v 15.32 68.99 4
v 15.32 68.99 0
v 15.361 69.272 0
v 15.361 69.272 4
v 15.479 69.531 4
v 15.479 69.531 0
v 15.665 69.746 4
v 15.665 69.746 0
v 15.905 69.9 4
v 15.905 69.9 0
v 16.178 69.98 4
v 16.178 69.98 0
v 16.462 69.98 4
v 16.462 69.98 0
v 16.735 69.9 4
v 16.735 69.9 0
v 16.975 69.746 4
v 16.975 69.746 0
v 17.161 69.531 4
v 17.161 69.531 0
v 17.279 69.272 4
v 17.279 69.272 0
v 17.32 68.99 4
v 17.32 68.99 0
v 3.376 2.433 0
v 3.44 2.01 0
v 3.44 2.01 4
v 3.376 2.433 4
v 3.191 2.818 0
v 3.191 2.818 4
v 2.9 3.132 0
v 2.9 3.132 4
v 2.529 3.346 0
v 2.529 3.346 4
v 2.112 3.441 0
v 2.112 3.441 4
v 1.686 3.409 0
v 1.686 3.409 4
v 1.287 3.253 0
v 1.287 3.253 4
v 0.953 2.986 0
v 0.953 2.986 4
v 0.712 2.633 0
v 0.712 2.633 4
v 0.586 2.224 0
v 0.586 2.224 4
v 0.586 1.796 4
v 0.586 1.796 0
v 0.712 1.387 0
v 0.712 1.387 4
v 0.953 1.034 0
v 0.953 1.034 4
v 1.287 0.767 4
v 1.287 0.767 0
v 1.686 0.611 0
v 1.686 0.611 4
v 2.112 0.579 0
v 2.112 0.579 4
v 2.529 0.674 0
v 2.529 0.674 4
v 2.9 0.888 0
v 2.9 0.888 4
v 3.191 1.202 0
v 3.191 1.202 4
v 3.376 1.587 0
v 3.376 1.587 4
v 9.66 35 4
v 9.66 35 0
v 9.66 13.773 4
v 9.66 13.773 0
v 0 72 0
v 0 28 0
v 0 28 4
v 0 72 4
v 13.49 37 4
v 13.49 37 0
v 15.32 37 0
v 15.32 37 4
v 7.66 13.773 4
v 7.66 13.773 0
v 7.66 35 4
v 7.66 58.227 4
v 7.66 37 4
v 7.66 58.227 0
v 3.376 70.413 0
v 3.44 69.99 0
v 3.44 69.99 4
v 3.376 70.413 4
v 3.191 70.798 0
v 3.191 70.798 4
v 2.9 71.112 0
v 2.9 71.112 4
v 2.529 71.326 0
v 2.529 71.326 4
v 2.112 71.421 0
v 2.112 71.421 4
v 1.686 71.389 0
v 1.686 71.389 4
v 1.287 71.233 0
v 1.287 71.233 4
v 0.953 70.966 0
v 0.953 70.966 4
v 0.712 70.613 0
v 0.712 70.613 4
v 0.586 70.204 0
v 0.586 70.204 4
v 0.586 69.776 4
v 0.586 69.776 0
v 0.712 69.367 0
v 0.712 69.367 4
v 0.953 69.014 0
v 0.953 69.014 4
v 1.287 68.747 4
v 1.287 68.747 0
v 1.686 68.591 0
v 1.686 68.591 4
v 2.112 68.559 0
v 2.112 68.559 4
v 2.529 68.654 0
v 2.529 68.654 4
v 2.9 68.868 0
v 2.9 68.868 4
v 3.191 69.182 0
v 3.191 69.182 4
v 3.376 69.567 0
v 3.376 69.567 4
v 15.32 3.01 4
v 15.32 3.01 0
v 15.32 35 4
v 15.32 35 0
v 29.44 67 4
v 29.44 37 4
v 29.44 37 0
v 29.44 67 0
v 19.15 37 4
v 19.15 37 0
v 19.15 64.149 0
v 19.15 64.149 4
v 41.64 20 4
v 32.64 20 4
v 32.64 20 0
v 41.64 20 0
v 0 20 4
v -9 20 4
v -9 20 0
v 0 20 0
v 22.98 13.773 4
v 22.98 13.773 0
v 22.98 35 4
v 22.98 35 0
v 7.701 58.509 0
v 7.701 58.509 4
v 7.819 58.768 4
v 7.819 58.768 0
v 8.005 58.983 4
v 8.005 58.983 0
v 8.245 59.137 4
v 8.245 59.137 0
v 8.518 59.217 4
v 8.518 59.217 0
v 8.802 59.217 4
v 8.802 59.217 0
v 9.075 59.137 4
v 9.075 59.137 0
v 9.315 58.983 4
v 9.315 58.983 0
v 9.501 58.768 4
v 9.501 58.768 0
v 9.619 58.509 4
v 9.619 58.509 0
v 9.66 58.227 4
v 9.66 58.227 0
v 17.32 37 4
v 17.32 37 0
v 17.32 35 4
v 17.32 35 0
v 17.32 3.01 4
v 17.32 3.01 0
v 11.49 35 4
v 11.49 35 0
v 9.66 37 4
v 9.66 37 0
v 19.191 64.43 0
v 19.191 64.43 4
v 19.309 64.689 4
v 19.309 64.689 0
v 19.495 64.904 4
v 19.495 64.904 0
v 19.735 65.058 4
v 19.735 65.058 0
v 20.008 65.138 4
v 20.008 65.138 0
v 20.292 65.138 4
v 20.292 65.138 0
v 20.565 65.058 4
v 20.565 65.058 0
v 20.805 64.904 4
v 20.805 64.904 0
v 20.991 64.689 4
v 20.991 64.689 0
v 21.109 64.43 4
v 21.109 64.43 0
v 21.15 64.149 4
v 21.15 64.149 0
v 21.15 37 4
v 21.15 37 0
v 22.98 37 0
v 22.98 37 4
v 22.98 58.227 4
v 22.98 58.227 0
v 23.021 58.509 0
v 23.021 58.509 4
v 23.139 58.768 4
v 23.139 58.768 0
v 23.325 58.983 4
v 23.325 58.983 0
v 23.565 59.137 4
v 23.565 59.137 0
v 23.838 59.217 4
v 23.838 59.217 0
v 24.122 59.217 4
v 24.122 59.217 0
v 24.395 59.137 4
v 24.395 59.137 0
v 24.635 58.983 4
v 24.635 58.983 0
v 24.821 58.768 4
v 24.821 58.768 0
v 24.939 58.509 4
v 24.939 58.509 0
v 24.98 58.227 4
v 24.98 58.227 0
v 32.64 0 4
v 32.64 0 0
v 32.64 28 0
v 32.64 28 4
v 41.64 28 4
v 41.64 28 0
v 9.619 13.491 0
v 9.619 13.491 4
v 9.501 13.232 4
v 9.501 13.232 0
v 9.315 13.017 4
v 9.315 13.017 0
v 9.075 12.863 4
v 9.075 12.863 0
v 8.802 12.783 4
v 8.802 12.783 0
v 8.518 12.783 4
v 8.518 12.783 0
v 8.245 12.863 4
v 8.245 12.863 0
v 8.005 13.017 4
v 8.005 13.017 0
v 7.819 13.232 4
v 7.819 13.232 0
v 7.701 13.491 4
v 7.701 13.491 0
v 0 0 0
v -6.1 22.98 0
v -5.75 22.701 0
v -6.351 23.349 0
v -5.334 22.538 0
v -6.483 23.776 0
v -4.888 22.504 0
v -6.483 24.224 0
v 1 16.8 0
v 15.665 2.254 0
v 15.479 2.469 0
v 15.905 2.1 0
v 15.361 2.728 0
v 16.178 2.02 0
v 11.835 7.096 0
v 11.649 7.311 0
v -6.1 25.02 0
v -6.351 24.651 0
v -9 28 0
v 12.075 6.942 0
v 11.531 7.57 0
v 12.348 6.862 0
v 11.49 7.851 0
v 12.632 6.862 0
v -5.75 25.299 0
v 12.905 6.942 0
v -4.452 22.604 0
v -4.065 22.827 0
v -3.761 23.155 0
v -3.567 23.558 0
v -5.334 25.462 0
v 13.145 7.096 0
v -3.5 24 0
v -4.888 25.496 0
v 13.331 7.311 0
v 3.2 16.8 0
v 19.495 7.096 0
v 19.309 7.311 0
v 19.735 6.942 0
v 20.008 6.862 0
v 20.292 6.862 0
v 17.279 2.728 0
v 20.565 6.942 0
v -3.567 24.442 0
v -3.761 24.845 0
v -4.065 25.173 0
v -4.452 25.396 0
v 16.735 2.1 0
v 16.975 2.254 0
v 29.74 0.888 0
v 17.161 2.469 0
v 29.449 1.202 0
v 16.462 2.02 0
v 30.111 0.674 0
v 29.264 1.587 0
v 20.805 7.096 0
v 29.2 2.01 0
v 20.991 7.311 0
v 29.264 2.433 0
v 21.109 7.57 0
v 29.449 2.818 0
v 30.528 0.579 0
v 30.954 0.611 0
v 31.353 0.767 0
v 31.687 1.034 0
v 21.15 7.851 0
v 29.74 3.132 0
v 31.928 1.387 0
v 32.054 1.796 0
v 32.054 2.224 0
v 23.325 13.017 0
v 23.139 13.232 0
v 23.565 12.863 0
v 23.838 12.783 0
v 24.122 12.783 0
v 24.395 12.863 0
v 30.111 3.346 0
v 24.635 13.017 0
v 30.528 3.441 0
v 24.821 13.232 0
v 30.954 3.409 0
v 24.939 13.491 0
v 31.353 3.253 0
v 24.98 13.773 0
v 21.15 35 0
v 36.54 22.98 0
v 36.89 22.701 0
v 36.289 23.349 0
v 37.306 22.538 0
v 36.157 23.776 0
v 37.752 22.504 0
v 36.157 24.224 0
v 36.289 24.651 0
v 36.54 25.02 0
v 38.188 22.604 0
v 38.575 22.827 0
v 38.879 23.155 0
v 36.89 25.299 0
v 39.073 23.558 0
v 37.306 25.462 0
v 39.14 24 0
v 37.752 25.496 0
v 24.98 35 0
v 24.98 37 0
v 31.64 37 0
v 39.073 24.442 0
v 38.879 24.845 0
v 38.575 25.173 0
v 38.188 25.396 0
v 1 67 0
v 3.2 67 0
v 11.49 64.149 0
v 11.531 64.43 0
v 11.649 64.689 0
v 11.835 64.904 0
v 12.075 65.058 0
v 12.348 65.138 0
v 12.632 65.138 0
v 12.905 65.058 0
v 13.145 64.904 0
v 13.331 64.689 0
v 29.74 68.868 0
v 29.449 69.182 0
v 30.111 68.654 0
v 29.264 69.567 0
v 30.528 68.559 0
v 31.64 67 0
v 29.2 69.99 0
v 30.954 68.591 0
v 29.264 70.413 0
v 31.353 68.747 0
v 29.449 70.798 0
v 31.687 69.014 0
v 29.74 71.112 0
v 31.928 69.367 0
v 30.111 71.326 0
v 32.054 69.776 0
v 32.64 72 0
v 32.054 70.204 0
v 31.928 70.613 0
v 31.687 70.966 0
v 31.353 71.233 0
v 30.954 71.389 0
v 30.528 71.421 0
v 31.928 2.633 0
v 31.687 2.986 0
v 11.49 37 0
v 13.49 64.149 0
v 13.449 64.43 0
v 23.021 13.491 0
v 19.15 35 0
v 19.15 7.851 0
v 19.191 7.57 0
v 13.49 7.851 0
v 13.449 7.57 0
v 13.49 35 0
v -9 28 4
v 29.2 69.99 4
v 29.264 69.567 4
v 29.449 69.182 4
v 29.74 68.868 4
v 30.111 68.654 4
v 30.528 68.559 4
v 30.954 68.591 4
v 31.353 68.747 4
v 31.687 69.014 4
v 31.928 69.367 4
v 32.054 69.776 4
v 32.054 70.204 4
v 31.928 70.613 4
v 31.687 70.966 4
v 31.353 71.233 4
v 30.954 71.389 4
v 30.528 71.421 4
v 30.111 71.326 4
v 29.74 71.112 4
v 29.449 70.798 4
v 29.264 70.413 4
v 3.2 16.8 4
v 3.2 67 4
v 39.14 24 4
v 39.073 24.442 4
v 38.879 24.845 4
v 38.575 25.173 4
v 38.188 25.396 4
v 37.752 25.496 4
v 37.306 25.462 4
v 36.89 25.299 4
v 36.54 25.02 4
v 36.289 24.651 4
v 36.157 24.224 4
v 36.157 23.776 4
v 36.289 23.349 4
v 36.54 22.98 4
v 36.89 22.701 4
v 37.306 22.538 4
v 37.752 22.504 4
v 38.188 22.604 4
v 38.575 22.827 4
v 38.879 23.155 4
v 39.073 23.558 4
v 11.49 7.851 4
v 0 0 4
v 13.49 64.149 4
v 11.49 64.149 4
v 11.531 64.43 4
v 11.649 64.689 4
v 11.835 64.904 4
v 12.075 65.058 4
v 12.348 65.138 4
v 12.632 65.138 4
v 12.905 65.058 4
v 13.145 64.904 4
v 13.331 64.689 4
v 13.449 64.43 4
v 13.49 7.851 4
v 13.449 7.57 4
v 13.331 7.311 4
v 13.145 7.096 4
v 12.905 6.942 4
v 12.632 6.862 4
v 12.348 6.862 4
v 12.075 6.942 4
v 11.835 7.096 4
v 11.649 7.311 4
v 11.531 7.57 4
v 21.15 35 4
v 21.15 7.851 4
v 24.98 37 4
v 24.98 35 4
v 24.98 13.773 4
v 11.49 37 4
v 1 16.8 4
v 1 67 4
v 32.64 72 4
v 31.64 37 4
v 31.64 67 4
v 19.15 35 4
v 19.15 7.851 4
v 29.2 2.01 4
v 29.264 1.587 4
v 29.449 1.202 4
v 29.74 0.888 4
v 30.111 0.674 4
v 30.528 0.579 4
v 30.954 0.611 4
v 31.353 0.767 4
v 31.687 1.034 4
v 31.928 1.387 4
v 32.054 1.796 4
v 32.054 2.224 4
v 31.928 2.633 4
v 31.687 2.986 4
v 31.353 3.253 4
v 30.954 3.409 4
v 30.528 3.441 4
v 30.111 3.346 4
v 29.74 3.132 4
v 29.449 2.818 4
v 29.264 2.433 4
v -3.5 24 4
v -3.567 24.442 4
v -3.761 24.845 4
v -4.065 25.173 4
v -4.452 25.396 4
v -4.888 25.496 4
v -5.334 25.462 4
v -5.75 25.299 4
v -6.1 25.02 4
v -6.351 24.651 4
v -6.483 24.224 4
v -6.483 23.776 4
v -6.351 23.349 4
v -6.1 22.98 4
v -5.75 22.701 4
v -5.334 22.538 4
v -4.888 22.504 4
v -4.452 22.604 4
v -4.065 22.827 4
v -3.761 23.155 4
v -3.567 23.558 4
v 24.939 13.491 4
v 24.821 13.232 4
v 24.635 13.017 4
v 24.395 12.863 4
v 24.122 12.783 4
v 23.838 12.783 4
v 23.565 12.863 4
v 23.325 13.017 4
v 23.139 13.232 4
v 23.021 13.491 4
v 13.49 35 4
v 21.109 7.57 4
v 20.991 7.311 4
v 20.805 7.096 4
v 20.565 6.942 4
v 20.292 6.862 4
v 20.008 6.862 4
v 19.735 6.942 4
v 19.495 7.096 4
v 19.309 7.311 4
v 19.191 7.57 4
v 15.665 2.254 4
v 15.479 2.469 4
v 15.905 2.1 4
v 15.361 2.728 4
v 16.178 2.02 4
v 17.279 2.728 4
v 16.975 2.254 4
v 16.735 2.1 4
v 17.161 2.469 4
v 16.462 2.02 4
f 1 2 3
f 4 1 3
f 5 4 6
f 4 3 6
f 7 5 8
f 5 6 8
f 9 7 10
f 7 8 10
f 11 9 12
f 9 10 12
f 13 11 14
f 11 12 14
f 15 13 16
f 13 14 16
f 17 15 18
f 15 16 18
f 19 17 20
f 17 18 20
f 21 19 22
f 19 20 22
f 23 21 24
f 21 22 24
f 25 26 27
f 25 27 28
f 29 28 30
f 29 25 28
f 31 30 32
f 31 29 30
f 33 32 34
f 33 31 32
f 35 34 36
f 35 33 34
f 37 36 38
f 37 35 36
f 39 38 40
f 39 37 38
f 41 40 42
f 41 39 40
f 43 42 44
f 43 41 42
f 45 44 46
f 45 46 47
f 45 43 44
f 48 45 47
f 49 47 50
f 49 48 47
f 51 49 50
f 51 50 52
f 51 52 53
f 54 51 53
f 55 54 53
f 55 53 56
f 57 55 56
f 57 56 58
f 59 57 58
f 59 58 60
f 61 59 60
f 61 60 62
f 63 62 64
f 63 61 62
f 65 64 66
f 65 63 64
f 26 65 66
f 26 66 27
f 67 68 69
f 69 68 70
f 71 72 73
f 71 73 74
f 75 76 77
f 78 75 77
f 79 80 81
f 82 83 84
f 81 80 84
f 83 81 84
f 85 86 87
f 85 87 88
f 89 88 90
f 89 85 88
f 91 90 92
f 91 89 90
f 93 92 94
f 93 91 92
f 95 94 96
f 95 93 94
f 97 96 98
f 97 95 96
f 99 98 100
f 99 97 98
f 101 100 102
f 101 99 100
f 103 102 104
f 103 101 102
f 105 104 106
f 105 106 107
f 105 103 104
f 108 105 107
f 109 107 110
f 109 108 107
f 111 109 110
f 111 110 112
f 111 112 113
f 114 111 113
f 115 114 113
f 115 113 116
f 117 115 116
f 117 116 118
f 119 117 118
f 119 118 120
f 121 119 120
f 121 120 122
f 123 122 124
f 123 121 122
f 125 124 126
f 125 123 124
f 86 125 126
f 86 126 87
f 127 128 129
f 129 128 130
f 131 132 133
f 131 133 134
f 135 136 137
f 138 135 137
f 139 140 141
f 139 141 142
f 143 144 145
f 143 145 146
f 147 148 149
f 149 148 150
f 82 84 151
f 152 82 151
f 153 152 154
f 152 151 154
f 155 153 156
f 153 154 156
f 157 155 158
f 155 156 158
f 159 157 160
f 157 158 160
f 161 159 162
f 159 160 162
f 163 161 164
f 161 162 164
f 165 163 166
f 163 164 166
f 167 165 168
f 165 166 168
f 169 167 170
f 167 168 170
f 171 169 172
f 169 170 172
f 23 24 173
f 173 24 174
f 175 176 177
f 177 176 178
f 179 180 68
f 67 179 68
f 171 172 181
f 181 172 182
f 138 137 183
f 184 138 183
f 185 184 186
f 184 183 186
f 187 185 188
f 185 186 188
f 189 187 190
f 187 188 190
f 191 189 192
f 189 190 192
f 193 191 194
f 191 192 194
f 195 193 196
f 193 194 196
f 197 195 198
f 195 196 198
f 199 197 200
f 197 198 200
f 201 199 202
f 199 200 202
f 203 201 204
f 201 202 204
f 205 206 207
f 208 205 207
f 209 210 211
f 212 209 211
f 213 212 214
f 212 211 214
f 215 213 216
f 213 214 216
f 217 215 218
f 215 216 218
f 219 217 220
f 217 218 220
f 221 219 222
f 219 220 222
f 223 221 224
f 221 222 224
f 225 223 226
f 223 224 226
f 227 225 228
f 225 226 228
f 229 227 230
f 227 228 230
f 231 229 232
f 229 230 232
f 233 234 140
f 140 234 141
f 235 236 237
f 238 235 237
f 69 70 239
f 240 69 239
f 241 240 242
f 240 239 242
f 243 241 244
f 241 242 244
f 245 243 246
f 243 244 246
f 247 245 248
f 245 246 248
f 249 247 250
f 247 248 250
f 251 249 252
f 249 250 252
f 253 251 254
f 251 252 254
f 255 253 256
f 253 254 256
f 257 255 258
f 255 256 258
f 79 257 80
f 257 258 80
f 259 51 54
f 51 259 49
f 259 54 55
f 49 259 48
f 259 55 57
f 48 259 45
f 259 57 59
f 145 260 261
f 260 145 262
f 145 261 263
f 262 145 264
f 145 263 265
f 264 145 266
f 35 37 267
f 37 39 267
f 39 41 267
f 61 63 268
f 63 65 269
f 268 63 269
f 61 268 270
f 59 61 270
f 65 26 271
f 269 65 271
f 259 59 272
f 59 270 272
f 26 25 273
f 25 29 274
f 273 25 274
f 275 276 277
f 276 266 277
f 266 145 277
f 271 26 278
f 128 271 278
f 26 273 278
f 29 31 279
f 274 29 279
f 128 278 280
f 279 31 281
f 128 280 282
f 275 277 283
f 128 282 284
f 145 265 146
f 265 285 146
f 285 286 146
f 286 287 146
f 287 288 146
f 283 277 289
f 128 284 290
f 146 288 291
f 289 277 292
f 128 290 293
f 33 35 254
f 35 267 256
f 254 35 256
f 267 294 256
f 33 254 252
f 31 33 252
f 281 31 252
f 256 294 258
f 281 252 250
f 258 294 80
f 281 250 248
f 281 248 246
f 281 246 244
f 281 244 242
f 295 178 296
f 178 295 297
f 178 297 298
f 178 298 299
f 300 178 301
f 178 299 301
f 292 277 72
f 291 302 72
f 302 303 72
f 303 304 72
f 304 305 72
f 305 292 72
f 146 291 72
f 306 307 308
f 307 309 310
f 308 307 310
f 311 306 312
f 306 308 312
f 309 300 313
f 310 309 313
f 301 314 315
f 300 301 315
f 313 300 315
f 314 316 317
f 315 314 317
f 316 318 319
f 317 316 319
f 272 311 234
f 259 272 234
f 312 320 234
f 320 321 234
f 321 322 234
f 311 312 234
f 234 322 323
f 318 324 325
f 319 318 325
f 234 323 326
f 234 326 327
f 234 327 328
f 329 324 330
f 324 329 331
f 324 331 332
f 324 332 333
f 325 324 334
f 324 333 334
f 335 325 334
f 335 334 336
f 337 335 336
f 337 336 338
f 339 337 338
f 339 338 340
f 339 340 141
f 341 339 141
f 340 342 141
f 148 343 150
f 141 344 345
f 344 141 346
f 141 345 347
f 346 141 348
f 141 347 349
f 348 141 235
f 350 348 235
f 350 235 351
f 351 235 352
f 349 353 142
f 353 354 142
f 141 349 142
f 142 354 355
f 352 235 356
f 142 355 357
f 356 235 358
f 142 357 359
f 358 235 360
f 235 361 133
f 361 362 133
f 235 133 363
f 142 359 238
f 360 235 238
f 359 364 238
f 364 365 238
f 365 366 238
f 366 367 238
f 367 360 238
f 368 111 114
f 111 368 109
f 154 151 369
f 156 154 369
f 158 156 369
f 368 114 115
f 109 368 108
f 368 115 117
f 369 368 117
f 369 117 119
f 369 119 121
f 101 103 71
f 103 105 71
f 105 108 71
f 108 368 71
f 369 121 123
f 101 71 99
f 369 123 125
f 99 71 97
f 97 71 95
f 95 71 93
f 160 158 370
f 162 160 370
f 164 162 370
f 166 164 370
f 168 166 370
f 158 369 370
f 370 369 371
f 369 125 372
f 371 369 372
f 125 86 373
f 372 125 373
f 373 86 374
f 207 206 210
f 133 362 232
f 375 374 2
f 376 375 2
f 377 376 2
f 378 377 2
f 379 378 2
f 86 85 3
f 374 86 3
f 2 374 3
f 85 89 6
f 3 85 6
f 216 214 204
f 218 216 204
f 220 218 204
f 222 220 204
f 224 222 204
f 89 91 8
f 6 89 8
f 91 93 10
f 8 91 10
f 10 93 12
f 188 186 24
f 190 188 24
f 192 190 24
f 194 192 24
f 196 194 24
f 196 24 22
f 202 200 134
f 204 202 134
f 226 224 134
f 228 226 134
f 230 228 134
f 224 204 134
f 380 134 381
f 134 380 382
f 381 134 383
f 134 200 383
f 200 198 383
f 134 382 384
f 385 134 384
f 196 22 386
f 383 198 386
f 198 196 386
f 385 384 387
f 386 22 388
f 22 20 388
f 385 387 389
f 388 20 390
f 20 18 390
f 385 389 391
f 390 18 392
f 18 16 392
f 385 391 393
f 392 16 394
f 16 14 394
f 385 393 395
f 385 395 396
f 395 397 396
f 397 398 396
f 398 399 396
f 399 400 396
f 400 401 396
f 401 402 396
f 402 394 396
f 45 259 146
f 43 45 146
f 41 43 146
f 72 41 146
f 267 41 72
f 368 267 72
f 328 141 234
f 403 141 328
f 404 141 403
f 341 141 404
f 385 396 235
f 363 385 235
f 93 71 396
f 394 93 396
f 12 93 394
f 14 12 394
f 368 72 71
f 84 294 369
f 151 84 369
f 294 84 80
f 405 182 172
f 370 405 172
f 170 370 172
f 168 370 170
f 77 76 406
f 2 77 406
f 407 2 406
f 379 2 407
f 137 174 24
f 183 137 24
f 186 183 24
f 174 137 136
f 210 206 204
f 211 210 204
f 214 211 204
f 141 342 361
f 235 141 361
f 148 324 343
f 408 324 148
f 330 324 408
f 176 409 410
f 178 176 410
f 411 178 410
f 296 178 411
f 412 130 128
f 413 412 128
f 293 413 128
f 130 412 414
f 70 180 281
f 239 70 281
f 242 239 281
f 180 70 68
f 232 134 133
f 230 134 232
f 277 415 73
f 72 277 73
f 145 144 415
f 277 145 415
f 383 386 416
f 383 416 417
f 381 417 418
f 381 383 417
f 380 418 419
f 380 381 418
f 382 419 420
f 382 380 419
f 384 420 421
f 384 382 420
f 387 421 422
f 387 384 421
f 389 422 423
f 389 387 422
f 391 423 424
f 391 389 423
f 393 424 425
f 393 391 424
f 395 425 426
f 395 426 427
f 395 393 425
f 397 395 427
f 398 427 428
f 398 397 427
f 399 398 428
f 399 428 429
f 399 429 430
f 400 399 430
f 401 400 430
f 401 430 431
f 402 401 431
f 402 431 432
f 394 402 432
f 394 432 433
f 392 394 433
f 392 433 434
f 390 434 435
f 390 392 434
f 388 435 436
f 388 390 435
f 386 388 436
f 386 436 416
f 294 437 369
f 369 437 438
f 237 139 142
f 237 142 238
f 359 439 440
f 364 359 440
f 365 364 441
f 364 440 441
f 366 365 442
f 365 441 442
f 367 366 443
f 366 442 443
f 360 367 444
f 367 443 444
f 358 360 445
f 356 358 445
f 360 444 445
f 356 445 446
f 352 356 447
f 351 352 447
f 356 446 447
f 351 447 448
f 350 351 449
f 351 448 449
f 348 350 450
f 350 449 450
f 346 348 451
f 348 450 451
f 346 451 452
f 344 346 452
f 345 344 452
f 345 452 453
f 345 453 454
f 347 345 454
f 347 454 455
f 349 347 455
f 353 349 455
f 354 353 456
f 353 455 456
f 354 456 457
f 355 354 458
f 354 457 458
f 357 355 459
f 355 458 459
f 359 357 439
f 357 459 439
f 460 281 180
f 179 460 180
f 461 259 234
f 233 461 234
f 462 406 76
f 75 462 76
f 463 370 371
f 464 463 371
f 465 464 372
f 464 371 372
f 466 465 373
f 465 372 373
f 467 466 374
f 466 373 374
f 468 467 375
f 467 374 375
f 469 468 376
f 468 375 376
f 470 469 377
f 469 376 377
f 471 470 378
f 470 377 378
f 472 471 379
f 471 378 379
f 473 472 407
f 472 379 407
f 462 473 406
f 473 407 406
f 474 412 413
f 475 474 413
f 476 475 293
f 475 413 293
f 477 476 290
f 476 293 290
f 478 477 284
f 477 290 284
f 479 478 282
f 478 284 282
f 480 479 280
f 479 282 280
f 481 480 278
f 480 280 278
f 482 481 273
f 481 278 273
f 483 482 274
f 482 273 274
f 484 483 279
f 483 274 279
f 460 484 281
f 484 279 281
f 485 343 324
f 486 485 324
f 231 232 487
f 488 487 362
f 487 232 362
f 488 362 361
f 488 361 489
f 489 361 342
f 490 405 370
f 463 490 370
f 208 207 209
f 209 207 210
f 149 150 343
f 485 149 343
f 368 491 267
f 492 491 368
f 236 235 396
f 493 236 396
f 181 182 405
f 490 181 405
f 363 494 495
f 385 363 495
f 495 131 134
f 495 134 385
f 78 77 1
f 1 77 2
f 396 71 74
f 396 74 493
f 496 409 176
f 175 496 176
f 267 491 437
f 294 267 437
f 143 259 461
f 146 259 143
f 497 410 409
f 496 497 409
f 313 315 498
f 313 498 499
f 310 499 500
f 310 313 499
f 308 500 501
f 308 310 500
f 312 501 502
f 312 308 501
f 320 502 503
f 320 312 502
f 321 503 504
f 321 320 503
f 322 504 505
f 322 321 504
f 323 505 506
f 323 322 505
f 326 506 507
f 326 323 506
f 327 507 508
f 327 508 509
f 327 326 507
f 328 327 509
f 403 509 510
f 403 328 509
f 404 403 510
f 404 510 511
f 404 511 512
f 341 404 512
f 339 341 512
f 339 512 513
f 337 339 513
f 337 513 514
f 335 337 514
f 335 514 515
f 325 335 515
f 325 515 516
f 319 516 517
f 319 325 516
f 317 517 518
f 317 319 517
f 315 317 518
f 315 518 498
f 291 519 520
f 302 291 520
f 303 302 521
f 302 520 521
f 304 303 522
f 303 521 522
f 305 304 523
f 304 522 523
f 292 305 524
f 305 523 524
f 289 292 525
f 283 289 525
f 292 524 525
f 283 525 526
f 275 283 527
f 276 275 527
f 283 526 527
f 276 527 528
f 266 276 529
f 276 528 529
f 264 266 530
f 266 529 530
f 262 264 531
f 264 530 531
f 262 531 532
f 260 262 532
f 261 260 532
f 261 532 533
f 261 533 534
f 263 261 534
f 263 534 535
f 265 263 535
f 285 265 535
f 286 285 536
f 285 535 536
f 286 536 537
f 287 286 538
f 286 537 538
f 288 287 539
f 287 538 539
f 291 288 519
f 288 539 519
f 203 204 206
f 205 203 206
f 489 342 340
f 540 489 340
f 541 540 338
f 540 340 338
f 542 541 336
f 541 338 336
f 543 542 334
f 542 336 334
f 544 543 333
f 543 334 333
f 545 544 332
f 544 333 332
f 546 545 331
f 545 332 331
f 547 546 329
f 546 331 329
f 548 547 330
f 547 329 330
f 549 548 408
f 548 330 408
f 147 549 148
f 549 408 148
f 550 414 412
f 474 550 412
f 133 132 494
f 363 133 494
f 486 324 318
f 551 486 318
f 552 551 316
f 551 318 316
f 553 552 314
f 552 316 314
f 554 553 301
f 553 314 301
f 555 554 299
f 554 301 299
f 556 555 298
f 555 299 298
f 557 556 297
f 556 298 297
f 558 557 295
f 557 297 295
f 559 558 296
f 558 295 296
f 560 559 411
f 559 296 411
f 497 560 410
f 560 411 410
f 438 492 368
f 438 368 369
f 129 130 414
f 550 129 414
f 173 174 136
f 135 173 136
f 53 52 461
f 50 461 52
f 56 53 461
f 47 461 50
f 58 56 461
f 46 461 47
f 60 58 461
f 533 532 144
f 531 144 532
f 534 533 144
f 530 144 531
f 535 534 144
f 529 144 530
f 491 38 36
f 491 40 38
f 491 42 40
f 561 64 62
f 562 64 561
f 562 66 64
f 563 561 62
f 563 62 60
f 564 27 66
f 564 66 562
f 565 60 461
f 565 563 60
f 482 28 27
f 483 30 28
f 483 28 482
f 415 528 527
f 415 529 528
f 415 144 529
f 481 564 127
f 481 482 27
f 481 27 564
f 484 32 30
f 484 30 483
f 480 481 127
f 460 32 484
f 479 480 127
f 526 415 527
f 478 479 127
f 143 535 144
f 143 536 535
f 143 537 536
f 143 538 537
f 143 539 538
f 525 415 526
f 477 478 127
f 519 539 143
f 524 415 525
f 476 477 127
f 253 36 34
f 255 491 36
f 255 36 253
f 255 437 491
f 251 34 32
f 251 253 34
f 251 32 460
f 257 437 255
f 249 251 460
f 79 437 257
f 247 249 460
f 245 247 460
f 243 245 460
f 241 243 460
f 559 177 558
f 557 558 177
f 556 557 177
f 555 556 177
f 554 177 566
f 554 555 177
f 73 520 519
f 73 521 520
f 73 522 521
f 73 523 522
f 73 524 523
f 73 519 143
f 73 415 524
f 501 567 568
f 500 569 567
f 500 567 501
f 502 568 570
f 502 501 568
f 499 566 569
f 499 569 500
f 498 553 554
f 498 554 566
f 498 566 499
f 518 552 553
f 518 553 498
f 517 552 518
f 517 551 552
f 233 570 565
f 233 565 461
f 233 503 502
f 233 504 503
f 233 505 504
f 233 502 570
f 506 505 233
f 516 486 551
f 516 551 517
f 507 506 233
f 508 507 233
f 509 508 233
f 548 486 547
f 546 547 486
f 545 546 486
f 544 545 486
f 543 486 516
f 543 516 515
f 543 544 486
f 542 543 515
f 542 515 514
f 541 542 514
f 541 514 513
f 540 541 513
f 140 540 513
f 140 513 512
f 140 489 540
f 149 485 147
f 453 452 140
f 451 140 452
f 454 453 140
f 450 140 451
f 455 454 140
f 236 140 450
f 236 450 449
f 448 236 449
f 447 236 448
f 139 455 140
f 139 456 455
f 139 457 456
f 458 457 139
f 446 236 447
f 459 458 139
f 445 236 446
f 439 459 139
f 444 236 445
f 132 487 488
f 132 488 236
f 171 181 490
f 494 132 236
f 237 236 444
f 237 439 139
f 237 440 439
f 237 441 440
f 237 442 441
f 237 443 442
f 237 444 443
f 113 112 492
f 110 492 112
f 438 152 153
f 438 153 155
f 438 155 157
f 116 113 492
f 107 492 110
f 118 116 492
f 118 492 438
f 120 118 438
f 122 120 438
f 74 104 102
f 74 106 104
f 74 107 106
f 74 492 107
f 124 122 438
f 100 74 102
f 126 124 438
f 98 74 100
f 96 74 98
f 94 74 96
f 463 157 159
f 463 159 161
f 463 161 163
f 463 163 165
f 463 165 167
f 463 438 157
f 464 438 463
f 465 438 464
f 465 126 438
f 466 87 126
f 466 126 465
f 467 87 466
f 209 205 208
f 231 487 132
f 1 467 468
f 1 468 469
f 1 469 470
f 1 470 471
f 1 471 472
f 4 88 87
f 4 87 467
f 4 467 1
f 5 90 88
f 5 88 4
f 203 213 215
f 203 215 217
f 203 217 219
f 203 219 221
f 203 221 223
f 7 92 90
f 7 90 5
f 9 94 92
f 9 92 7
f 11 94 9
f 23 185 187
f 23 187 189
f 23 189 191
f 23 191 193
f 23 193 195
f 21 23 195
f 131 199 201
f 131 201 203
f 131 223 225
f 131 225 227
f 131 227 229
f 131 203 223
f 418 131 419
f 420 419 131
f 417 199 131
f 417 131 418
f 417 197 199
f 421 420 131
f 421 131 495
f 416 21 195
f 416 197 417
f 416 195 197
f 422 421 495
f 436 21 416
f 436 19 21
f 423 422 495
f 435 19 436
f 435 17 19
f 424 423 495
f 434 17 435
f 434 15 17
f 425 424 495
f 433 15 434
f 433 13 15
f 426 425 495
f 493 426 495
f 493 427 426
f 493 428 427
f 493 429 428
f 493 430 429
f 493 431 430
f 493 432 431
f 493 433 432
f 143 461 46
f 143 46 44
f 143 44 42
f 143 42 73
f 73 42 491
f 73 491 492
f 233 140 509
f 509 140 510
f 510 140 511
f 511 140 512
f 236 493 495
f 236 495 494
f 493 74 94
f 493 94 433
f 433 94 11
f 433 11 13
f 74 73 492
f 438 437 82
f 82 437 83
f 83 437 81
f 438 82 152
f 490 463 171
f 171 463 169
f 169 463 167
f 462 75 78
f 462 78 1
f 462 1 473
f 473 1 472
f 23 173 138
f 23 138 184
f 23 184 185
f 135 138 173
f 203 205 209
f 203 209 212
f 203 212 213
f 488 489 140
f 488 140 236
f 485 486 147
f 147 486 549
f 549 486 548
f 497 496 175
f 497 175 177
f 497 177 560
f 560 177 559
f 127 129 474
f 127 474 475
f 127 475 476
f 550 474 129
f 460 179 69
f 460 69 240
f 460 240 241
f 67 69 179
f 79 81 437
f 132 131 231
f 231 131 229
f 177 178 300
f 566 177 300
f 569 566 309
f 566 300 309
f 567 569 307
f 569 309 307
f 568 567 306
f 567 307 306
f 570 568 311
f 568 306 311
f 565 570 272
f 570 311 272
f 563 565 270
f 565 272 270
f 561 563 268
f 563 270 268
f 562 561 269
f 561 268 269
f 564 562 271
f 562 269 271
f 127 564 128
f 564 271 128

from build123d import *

# Parameters (mm, degrees)
CROQUIS1_W              = 32.64
CROQUIS1_H              = 72
CROQUIS1_R              = 1.435
SALIENTE_EXTRUIR4_DEPTH = 4
CROQUIS3_W              = 9
CROQUIS3_H              = 8
CROQUIS3_R              = 1.5
SALIENTE_EXTRUIR5_DEPTH = 4
CROQUIS6_W              = 5.968272271
CROQUIS6_H              = 30
SALIENTE_EXTRUIR6_DEPTH = 4
CROQUIS5_W              = 2.2
CROQUIS5_H              = 50.2
CROQUIS5_H_2            = 30
CORTAR_EXTRUIR1_DEPTH   = 4


with BuildPart() as part:
    # Croquis1 → Saliente-Extruir4 (new body)
    with BuildSketch(Plane.XY):
        with Locations((16.32, 36)):
            Rectangle(CROQUIS1_W, CROQUIS1_H)
        with Locations((2.005, 69.99)):
            Circle(CROQUIS1_R, mode=Mode.SUBTRACT)
        with Locations((2.005, 2.01)):
            Circle(CROQUIS1_R, mode=Mode.SUBTRACT)
        with Locations(Location((30.635, 2.01, 0), (0, 0, 180))):
            Circle(CROQUIS1_R, mode=Mode.SUBTRACT)
        with Locations(Location((30.635, 69.99, 0), (0, 0, 180))):
            Circle(CROQUIS1_R, mode=Mode.SUBTRACT)
        with BuildLine():
            Line((15.32, 3.01), (15.32, 35))
            Line((15.32, 35), (13.49, 35))
            Line((13.49, 35), (13.49, 34))
            Line((13.49, 34), (13.49, 7.851322515))
            ThreePointArc((13.49, 7.851322515), (12.49, 6.851322515), (11.49, 7.851322515))
            Line((11.49, 7.851322515), (11.49, 34))
            Line((11.49, 34), (11.49, 35))
            Line((11.49, 35), (9.66, 35))
            Line((9.66, 35), (9.66, 34))
            Line((9.66, 34), (9.66, 13.772536222))
            ThreePointArc((9.66, 13.772536222), (8.66, 12.772536222), (7.66, 13.772536222))
            Line((7.66, 13.772536222), (7.66, 34))
            Line((7.66, 34), (7.66, 35))
            Line((7.66, 35), (5.83, 35))
            Line((5.83, 35), (5.83, 34))
            Line((5.83, 34), (5.83, 23.099052443))
            ThreePointArc((5.83, 23.099052443), (4.83, 22.099052443), (3.83, 23.099052443))
            Line((3.83, 23.099052443), (3.83, 34))
            Line((3.83, 34), (3.83, 35))
            Line((3.83, 35), (3.005, 35))
            ThreePointArc((3.005, 35), (2.005, 36), (3.005, 37))
            Line((3.005, 37), (3.83, 37))
            Line((3.83, 37), (3.83, 38))
            Line((3.83, 38), (3.83, 48.900947557))
            ThreePointArc((3.83, 48.900947557), (4.83, 49.900947557), (5.83, 48.900947557))
            Line((5.83, 48.900947557), (5.83, 38))
            Line((5.83, 38), (5.83, 37))
            Line((5.83, 37), (7.66, 37))
            Line((7.66, 37), (7.66, 38))
            Line((7.66, 38), (7.66, 58.227463778))
            ThreePointArc((7.66, 58.227463778), (8.66, 59.227463778), (9.66, 58.227463778))
            Line((9.66, 58.227463778), (9.66, 38))
            Line((9.66, 38), (9.66, 37))
            Line((9.66, 37), (11.49, 37))
            Line((11.49, 37), (11.49, 38))
            Line((11.49, 38), (11.49, 64.148677485))
            ThreePointArc((11.49, 64.148677485), (12.49, 65.148677485), (13.49, 64.148677485))
            Line((13.49, 64.148677485), (13.49, 38))
            Line((13.49, 38), (13.49, 37))
            Line((13.49, 37), (15.32, 37))
            Line((15.32, 37), (15.32, 68.99))
            ThreePointArc((15.32, 68.99), (16.32, 69.99), (17.32, 68.99))
            Line((17.32, 68.99), (17.32, 37))
            Line((17.32, 37), (19.15, 37))
            Line((19.15, 37), (19.15, 38))
            Line((19.15, 38), (19.15, 64.148677485))
            ThreePointArc((19.15, 64.148677485), (20.15, 65.148677485), (21.15, 64.148677485))
            Line((21.15, 64.148677485), (21.15, 38))
            Line((21.15, 38), (21.15, 37))
            Line((21.15, 37), (22.98, 37))
            Line((22.98, 37), (22.98, 38))
            Line((22.98, 38), (22.98, 58.227463778))
            ThreePointArc((22.98, 58.227463778), (23.98, 59.227463778), (24.98, 58.227463778))
            Line((24.98, 58.227463778), (24.98, 38))
            Line((24.98, 38), (24.98, 37))
            Line((24.98, 37), (26.81, 37))
            Line((26.81, 37), (26.81, 38))
            Line((26.81, 38), (26.81, 48.900947557))
            ThreePointArc((26.81, 48.900947557), (27.81, 49.900947557), (28.81, 48.900947557))
            Line((28.81, 48.900947557), (28.81, 38))
            Line((28.81, 38), (28.81, 37))
            Line((28.81, 37), (29.635, 37))
            ThreePointArc((29.635, 37), (30.635, 36), (29.635, 35))
            Line((29.635, 35), (28.81, 35))
            Line((28.81, 35), (28.81, 34))
            Line((28.81, 34), (28.81, 23.099052443))
            ThreePointArc((28.81, 23.099052443), (27.81, 22.099052443), (26.81, 23.099052443))
            Line((26.81, 23.099052443), (26.81, 34))
            Line((26.81, 34), (26.81, 35))
            Line((26.81, 35), (24.98, 35))
            Line((24.98, 35), (24.98, 34))
            Line((24.98, 34), (24.98, 13.772536222))
            ThreePointArc((24.98, 13.772536222), (23.98, 12.772536222), (22.98, 13.772536222))
            Line((22.98, 13.772536222), (22.98, 34))
            Line((22.98, 34), (22.98, 35))
            Line((22.98, 35), (21.15, 35))
            Line((21.15, 35), (21.15, 34))
            Line((21.15, 34), (21.15, 7.851322515))
            ThreePointArc((21.15, 7.851322515), (20.15, 6.851322515), (19.15, 7.851322515))
            Line((19.15, 7.851322515), (19.15, 34))
            Line((19.15, 34), (19.15, 35))
            Line((19.15, 35), (17.32, 35))
            Line((17.32, 35), (17.32, 3.01))
            ThreePointArc((17.32, 3.01), (16.32, 2.01), (15.32, 3.01))
        make_face(mode=Mode.SUBTRACT)
    extrude(amount=SALIENTE_EXTRUIR4_DEPTH)

    # Croquis3 → Saliente-Extruir5 (add)
    # profile 1 of 2: a face of its own
    with BuildSketch(Plane.XY.offset(4)):
        with Locations((-4.5, 24)):
            Rectangle(CROQUIS3_W, CROQUIS3_H)
        with Locations((-5, 24)):
            Circle(CROQUIS3_R, mode=Mode.SUBTRACT)
    # profile 2 of 2: a face of its own
    with BuildSketch(Plane.XY.offset(4)):
        with Locations((37.14, 24)):
            Rectangle(CROQUIS3_W, CROQUIS3_H)
        with Locations((37.64, 24)):
            Circle(CROQUIS3_R, mode=Mode.SUBTRACT)
    extrude(amount=-SALIENTE_EXTRUIR5_DEPTH)

    # Croquis6 → Saliente-Extruir6 (add)
    with BuildSketch(Plane.XY.offset(4)):
        with Locations((4.675863865, 36)):
            Rectangle(CROQUIS6_W, CROQUIS6_H)
        with Locations((27.964136135, 36)):
            Rectangle(CROQUIS6_W, CROQUIS6_H)
    extrude(amount=-SALIENTE_EXTRUIR6_DEPTH)

    # Croquis5 → Cortar-Extruir1 (cut)
    with BuildSketch(Plane.XY.offset(4)):
        with Locations((2.1, 41.9)):
            Rectangle(CROQUIS5_W, CROQUIS5_H)
        with Locations((30.54, 52)):
            Rectangle(CROQUIS5_W, CROQUIS5_H_2)
    extrude(amount=-CORTAR_EXTRUIR1_DEPTH, mode=Mode.SUBTRACT)


solid = part.part
